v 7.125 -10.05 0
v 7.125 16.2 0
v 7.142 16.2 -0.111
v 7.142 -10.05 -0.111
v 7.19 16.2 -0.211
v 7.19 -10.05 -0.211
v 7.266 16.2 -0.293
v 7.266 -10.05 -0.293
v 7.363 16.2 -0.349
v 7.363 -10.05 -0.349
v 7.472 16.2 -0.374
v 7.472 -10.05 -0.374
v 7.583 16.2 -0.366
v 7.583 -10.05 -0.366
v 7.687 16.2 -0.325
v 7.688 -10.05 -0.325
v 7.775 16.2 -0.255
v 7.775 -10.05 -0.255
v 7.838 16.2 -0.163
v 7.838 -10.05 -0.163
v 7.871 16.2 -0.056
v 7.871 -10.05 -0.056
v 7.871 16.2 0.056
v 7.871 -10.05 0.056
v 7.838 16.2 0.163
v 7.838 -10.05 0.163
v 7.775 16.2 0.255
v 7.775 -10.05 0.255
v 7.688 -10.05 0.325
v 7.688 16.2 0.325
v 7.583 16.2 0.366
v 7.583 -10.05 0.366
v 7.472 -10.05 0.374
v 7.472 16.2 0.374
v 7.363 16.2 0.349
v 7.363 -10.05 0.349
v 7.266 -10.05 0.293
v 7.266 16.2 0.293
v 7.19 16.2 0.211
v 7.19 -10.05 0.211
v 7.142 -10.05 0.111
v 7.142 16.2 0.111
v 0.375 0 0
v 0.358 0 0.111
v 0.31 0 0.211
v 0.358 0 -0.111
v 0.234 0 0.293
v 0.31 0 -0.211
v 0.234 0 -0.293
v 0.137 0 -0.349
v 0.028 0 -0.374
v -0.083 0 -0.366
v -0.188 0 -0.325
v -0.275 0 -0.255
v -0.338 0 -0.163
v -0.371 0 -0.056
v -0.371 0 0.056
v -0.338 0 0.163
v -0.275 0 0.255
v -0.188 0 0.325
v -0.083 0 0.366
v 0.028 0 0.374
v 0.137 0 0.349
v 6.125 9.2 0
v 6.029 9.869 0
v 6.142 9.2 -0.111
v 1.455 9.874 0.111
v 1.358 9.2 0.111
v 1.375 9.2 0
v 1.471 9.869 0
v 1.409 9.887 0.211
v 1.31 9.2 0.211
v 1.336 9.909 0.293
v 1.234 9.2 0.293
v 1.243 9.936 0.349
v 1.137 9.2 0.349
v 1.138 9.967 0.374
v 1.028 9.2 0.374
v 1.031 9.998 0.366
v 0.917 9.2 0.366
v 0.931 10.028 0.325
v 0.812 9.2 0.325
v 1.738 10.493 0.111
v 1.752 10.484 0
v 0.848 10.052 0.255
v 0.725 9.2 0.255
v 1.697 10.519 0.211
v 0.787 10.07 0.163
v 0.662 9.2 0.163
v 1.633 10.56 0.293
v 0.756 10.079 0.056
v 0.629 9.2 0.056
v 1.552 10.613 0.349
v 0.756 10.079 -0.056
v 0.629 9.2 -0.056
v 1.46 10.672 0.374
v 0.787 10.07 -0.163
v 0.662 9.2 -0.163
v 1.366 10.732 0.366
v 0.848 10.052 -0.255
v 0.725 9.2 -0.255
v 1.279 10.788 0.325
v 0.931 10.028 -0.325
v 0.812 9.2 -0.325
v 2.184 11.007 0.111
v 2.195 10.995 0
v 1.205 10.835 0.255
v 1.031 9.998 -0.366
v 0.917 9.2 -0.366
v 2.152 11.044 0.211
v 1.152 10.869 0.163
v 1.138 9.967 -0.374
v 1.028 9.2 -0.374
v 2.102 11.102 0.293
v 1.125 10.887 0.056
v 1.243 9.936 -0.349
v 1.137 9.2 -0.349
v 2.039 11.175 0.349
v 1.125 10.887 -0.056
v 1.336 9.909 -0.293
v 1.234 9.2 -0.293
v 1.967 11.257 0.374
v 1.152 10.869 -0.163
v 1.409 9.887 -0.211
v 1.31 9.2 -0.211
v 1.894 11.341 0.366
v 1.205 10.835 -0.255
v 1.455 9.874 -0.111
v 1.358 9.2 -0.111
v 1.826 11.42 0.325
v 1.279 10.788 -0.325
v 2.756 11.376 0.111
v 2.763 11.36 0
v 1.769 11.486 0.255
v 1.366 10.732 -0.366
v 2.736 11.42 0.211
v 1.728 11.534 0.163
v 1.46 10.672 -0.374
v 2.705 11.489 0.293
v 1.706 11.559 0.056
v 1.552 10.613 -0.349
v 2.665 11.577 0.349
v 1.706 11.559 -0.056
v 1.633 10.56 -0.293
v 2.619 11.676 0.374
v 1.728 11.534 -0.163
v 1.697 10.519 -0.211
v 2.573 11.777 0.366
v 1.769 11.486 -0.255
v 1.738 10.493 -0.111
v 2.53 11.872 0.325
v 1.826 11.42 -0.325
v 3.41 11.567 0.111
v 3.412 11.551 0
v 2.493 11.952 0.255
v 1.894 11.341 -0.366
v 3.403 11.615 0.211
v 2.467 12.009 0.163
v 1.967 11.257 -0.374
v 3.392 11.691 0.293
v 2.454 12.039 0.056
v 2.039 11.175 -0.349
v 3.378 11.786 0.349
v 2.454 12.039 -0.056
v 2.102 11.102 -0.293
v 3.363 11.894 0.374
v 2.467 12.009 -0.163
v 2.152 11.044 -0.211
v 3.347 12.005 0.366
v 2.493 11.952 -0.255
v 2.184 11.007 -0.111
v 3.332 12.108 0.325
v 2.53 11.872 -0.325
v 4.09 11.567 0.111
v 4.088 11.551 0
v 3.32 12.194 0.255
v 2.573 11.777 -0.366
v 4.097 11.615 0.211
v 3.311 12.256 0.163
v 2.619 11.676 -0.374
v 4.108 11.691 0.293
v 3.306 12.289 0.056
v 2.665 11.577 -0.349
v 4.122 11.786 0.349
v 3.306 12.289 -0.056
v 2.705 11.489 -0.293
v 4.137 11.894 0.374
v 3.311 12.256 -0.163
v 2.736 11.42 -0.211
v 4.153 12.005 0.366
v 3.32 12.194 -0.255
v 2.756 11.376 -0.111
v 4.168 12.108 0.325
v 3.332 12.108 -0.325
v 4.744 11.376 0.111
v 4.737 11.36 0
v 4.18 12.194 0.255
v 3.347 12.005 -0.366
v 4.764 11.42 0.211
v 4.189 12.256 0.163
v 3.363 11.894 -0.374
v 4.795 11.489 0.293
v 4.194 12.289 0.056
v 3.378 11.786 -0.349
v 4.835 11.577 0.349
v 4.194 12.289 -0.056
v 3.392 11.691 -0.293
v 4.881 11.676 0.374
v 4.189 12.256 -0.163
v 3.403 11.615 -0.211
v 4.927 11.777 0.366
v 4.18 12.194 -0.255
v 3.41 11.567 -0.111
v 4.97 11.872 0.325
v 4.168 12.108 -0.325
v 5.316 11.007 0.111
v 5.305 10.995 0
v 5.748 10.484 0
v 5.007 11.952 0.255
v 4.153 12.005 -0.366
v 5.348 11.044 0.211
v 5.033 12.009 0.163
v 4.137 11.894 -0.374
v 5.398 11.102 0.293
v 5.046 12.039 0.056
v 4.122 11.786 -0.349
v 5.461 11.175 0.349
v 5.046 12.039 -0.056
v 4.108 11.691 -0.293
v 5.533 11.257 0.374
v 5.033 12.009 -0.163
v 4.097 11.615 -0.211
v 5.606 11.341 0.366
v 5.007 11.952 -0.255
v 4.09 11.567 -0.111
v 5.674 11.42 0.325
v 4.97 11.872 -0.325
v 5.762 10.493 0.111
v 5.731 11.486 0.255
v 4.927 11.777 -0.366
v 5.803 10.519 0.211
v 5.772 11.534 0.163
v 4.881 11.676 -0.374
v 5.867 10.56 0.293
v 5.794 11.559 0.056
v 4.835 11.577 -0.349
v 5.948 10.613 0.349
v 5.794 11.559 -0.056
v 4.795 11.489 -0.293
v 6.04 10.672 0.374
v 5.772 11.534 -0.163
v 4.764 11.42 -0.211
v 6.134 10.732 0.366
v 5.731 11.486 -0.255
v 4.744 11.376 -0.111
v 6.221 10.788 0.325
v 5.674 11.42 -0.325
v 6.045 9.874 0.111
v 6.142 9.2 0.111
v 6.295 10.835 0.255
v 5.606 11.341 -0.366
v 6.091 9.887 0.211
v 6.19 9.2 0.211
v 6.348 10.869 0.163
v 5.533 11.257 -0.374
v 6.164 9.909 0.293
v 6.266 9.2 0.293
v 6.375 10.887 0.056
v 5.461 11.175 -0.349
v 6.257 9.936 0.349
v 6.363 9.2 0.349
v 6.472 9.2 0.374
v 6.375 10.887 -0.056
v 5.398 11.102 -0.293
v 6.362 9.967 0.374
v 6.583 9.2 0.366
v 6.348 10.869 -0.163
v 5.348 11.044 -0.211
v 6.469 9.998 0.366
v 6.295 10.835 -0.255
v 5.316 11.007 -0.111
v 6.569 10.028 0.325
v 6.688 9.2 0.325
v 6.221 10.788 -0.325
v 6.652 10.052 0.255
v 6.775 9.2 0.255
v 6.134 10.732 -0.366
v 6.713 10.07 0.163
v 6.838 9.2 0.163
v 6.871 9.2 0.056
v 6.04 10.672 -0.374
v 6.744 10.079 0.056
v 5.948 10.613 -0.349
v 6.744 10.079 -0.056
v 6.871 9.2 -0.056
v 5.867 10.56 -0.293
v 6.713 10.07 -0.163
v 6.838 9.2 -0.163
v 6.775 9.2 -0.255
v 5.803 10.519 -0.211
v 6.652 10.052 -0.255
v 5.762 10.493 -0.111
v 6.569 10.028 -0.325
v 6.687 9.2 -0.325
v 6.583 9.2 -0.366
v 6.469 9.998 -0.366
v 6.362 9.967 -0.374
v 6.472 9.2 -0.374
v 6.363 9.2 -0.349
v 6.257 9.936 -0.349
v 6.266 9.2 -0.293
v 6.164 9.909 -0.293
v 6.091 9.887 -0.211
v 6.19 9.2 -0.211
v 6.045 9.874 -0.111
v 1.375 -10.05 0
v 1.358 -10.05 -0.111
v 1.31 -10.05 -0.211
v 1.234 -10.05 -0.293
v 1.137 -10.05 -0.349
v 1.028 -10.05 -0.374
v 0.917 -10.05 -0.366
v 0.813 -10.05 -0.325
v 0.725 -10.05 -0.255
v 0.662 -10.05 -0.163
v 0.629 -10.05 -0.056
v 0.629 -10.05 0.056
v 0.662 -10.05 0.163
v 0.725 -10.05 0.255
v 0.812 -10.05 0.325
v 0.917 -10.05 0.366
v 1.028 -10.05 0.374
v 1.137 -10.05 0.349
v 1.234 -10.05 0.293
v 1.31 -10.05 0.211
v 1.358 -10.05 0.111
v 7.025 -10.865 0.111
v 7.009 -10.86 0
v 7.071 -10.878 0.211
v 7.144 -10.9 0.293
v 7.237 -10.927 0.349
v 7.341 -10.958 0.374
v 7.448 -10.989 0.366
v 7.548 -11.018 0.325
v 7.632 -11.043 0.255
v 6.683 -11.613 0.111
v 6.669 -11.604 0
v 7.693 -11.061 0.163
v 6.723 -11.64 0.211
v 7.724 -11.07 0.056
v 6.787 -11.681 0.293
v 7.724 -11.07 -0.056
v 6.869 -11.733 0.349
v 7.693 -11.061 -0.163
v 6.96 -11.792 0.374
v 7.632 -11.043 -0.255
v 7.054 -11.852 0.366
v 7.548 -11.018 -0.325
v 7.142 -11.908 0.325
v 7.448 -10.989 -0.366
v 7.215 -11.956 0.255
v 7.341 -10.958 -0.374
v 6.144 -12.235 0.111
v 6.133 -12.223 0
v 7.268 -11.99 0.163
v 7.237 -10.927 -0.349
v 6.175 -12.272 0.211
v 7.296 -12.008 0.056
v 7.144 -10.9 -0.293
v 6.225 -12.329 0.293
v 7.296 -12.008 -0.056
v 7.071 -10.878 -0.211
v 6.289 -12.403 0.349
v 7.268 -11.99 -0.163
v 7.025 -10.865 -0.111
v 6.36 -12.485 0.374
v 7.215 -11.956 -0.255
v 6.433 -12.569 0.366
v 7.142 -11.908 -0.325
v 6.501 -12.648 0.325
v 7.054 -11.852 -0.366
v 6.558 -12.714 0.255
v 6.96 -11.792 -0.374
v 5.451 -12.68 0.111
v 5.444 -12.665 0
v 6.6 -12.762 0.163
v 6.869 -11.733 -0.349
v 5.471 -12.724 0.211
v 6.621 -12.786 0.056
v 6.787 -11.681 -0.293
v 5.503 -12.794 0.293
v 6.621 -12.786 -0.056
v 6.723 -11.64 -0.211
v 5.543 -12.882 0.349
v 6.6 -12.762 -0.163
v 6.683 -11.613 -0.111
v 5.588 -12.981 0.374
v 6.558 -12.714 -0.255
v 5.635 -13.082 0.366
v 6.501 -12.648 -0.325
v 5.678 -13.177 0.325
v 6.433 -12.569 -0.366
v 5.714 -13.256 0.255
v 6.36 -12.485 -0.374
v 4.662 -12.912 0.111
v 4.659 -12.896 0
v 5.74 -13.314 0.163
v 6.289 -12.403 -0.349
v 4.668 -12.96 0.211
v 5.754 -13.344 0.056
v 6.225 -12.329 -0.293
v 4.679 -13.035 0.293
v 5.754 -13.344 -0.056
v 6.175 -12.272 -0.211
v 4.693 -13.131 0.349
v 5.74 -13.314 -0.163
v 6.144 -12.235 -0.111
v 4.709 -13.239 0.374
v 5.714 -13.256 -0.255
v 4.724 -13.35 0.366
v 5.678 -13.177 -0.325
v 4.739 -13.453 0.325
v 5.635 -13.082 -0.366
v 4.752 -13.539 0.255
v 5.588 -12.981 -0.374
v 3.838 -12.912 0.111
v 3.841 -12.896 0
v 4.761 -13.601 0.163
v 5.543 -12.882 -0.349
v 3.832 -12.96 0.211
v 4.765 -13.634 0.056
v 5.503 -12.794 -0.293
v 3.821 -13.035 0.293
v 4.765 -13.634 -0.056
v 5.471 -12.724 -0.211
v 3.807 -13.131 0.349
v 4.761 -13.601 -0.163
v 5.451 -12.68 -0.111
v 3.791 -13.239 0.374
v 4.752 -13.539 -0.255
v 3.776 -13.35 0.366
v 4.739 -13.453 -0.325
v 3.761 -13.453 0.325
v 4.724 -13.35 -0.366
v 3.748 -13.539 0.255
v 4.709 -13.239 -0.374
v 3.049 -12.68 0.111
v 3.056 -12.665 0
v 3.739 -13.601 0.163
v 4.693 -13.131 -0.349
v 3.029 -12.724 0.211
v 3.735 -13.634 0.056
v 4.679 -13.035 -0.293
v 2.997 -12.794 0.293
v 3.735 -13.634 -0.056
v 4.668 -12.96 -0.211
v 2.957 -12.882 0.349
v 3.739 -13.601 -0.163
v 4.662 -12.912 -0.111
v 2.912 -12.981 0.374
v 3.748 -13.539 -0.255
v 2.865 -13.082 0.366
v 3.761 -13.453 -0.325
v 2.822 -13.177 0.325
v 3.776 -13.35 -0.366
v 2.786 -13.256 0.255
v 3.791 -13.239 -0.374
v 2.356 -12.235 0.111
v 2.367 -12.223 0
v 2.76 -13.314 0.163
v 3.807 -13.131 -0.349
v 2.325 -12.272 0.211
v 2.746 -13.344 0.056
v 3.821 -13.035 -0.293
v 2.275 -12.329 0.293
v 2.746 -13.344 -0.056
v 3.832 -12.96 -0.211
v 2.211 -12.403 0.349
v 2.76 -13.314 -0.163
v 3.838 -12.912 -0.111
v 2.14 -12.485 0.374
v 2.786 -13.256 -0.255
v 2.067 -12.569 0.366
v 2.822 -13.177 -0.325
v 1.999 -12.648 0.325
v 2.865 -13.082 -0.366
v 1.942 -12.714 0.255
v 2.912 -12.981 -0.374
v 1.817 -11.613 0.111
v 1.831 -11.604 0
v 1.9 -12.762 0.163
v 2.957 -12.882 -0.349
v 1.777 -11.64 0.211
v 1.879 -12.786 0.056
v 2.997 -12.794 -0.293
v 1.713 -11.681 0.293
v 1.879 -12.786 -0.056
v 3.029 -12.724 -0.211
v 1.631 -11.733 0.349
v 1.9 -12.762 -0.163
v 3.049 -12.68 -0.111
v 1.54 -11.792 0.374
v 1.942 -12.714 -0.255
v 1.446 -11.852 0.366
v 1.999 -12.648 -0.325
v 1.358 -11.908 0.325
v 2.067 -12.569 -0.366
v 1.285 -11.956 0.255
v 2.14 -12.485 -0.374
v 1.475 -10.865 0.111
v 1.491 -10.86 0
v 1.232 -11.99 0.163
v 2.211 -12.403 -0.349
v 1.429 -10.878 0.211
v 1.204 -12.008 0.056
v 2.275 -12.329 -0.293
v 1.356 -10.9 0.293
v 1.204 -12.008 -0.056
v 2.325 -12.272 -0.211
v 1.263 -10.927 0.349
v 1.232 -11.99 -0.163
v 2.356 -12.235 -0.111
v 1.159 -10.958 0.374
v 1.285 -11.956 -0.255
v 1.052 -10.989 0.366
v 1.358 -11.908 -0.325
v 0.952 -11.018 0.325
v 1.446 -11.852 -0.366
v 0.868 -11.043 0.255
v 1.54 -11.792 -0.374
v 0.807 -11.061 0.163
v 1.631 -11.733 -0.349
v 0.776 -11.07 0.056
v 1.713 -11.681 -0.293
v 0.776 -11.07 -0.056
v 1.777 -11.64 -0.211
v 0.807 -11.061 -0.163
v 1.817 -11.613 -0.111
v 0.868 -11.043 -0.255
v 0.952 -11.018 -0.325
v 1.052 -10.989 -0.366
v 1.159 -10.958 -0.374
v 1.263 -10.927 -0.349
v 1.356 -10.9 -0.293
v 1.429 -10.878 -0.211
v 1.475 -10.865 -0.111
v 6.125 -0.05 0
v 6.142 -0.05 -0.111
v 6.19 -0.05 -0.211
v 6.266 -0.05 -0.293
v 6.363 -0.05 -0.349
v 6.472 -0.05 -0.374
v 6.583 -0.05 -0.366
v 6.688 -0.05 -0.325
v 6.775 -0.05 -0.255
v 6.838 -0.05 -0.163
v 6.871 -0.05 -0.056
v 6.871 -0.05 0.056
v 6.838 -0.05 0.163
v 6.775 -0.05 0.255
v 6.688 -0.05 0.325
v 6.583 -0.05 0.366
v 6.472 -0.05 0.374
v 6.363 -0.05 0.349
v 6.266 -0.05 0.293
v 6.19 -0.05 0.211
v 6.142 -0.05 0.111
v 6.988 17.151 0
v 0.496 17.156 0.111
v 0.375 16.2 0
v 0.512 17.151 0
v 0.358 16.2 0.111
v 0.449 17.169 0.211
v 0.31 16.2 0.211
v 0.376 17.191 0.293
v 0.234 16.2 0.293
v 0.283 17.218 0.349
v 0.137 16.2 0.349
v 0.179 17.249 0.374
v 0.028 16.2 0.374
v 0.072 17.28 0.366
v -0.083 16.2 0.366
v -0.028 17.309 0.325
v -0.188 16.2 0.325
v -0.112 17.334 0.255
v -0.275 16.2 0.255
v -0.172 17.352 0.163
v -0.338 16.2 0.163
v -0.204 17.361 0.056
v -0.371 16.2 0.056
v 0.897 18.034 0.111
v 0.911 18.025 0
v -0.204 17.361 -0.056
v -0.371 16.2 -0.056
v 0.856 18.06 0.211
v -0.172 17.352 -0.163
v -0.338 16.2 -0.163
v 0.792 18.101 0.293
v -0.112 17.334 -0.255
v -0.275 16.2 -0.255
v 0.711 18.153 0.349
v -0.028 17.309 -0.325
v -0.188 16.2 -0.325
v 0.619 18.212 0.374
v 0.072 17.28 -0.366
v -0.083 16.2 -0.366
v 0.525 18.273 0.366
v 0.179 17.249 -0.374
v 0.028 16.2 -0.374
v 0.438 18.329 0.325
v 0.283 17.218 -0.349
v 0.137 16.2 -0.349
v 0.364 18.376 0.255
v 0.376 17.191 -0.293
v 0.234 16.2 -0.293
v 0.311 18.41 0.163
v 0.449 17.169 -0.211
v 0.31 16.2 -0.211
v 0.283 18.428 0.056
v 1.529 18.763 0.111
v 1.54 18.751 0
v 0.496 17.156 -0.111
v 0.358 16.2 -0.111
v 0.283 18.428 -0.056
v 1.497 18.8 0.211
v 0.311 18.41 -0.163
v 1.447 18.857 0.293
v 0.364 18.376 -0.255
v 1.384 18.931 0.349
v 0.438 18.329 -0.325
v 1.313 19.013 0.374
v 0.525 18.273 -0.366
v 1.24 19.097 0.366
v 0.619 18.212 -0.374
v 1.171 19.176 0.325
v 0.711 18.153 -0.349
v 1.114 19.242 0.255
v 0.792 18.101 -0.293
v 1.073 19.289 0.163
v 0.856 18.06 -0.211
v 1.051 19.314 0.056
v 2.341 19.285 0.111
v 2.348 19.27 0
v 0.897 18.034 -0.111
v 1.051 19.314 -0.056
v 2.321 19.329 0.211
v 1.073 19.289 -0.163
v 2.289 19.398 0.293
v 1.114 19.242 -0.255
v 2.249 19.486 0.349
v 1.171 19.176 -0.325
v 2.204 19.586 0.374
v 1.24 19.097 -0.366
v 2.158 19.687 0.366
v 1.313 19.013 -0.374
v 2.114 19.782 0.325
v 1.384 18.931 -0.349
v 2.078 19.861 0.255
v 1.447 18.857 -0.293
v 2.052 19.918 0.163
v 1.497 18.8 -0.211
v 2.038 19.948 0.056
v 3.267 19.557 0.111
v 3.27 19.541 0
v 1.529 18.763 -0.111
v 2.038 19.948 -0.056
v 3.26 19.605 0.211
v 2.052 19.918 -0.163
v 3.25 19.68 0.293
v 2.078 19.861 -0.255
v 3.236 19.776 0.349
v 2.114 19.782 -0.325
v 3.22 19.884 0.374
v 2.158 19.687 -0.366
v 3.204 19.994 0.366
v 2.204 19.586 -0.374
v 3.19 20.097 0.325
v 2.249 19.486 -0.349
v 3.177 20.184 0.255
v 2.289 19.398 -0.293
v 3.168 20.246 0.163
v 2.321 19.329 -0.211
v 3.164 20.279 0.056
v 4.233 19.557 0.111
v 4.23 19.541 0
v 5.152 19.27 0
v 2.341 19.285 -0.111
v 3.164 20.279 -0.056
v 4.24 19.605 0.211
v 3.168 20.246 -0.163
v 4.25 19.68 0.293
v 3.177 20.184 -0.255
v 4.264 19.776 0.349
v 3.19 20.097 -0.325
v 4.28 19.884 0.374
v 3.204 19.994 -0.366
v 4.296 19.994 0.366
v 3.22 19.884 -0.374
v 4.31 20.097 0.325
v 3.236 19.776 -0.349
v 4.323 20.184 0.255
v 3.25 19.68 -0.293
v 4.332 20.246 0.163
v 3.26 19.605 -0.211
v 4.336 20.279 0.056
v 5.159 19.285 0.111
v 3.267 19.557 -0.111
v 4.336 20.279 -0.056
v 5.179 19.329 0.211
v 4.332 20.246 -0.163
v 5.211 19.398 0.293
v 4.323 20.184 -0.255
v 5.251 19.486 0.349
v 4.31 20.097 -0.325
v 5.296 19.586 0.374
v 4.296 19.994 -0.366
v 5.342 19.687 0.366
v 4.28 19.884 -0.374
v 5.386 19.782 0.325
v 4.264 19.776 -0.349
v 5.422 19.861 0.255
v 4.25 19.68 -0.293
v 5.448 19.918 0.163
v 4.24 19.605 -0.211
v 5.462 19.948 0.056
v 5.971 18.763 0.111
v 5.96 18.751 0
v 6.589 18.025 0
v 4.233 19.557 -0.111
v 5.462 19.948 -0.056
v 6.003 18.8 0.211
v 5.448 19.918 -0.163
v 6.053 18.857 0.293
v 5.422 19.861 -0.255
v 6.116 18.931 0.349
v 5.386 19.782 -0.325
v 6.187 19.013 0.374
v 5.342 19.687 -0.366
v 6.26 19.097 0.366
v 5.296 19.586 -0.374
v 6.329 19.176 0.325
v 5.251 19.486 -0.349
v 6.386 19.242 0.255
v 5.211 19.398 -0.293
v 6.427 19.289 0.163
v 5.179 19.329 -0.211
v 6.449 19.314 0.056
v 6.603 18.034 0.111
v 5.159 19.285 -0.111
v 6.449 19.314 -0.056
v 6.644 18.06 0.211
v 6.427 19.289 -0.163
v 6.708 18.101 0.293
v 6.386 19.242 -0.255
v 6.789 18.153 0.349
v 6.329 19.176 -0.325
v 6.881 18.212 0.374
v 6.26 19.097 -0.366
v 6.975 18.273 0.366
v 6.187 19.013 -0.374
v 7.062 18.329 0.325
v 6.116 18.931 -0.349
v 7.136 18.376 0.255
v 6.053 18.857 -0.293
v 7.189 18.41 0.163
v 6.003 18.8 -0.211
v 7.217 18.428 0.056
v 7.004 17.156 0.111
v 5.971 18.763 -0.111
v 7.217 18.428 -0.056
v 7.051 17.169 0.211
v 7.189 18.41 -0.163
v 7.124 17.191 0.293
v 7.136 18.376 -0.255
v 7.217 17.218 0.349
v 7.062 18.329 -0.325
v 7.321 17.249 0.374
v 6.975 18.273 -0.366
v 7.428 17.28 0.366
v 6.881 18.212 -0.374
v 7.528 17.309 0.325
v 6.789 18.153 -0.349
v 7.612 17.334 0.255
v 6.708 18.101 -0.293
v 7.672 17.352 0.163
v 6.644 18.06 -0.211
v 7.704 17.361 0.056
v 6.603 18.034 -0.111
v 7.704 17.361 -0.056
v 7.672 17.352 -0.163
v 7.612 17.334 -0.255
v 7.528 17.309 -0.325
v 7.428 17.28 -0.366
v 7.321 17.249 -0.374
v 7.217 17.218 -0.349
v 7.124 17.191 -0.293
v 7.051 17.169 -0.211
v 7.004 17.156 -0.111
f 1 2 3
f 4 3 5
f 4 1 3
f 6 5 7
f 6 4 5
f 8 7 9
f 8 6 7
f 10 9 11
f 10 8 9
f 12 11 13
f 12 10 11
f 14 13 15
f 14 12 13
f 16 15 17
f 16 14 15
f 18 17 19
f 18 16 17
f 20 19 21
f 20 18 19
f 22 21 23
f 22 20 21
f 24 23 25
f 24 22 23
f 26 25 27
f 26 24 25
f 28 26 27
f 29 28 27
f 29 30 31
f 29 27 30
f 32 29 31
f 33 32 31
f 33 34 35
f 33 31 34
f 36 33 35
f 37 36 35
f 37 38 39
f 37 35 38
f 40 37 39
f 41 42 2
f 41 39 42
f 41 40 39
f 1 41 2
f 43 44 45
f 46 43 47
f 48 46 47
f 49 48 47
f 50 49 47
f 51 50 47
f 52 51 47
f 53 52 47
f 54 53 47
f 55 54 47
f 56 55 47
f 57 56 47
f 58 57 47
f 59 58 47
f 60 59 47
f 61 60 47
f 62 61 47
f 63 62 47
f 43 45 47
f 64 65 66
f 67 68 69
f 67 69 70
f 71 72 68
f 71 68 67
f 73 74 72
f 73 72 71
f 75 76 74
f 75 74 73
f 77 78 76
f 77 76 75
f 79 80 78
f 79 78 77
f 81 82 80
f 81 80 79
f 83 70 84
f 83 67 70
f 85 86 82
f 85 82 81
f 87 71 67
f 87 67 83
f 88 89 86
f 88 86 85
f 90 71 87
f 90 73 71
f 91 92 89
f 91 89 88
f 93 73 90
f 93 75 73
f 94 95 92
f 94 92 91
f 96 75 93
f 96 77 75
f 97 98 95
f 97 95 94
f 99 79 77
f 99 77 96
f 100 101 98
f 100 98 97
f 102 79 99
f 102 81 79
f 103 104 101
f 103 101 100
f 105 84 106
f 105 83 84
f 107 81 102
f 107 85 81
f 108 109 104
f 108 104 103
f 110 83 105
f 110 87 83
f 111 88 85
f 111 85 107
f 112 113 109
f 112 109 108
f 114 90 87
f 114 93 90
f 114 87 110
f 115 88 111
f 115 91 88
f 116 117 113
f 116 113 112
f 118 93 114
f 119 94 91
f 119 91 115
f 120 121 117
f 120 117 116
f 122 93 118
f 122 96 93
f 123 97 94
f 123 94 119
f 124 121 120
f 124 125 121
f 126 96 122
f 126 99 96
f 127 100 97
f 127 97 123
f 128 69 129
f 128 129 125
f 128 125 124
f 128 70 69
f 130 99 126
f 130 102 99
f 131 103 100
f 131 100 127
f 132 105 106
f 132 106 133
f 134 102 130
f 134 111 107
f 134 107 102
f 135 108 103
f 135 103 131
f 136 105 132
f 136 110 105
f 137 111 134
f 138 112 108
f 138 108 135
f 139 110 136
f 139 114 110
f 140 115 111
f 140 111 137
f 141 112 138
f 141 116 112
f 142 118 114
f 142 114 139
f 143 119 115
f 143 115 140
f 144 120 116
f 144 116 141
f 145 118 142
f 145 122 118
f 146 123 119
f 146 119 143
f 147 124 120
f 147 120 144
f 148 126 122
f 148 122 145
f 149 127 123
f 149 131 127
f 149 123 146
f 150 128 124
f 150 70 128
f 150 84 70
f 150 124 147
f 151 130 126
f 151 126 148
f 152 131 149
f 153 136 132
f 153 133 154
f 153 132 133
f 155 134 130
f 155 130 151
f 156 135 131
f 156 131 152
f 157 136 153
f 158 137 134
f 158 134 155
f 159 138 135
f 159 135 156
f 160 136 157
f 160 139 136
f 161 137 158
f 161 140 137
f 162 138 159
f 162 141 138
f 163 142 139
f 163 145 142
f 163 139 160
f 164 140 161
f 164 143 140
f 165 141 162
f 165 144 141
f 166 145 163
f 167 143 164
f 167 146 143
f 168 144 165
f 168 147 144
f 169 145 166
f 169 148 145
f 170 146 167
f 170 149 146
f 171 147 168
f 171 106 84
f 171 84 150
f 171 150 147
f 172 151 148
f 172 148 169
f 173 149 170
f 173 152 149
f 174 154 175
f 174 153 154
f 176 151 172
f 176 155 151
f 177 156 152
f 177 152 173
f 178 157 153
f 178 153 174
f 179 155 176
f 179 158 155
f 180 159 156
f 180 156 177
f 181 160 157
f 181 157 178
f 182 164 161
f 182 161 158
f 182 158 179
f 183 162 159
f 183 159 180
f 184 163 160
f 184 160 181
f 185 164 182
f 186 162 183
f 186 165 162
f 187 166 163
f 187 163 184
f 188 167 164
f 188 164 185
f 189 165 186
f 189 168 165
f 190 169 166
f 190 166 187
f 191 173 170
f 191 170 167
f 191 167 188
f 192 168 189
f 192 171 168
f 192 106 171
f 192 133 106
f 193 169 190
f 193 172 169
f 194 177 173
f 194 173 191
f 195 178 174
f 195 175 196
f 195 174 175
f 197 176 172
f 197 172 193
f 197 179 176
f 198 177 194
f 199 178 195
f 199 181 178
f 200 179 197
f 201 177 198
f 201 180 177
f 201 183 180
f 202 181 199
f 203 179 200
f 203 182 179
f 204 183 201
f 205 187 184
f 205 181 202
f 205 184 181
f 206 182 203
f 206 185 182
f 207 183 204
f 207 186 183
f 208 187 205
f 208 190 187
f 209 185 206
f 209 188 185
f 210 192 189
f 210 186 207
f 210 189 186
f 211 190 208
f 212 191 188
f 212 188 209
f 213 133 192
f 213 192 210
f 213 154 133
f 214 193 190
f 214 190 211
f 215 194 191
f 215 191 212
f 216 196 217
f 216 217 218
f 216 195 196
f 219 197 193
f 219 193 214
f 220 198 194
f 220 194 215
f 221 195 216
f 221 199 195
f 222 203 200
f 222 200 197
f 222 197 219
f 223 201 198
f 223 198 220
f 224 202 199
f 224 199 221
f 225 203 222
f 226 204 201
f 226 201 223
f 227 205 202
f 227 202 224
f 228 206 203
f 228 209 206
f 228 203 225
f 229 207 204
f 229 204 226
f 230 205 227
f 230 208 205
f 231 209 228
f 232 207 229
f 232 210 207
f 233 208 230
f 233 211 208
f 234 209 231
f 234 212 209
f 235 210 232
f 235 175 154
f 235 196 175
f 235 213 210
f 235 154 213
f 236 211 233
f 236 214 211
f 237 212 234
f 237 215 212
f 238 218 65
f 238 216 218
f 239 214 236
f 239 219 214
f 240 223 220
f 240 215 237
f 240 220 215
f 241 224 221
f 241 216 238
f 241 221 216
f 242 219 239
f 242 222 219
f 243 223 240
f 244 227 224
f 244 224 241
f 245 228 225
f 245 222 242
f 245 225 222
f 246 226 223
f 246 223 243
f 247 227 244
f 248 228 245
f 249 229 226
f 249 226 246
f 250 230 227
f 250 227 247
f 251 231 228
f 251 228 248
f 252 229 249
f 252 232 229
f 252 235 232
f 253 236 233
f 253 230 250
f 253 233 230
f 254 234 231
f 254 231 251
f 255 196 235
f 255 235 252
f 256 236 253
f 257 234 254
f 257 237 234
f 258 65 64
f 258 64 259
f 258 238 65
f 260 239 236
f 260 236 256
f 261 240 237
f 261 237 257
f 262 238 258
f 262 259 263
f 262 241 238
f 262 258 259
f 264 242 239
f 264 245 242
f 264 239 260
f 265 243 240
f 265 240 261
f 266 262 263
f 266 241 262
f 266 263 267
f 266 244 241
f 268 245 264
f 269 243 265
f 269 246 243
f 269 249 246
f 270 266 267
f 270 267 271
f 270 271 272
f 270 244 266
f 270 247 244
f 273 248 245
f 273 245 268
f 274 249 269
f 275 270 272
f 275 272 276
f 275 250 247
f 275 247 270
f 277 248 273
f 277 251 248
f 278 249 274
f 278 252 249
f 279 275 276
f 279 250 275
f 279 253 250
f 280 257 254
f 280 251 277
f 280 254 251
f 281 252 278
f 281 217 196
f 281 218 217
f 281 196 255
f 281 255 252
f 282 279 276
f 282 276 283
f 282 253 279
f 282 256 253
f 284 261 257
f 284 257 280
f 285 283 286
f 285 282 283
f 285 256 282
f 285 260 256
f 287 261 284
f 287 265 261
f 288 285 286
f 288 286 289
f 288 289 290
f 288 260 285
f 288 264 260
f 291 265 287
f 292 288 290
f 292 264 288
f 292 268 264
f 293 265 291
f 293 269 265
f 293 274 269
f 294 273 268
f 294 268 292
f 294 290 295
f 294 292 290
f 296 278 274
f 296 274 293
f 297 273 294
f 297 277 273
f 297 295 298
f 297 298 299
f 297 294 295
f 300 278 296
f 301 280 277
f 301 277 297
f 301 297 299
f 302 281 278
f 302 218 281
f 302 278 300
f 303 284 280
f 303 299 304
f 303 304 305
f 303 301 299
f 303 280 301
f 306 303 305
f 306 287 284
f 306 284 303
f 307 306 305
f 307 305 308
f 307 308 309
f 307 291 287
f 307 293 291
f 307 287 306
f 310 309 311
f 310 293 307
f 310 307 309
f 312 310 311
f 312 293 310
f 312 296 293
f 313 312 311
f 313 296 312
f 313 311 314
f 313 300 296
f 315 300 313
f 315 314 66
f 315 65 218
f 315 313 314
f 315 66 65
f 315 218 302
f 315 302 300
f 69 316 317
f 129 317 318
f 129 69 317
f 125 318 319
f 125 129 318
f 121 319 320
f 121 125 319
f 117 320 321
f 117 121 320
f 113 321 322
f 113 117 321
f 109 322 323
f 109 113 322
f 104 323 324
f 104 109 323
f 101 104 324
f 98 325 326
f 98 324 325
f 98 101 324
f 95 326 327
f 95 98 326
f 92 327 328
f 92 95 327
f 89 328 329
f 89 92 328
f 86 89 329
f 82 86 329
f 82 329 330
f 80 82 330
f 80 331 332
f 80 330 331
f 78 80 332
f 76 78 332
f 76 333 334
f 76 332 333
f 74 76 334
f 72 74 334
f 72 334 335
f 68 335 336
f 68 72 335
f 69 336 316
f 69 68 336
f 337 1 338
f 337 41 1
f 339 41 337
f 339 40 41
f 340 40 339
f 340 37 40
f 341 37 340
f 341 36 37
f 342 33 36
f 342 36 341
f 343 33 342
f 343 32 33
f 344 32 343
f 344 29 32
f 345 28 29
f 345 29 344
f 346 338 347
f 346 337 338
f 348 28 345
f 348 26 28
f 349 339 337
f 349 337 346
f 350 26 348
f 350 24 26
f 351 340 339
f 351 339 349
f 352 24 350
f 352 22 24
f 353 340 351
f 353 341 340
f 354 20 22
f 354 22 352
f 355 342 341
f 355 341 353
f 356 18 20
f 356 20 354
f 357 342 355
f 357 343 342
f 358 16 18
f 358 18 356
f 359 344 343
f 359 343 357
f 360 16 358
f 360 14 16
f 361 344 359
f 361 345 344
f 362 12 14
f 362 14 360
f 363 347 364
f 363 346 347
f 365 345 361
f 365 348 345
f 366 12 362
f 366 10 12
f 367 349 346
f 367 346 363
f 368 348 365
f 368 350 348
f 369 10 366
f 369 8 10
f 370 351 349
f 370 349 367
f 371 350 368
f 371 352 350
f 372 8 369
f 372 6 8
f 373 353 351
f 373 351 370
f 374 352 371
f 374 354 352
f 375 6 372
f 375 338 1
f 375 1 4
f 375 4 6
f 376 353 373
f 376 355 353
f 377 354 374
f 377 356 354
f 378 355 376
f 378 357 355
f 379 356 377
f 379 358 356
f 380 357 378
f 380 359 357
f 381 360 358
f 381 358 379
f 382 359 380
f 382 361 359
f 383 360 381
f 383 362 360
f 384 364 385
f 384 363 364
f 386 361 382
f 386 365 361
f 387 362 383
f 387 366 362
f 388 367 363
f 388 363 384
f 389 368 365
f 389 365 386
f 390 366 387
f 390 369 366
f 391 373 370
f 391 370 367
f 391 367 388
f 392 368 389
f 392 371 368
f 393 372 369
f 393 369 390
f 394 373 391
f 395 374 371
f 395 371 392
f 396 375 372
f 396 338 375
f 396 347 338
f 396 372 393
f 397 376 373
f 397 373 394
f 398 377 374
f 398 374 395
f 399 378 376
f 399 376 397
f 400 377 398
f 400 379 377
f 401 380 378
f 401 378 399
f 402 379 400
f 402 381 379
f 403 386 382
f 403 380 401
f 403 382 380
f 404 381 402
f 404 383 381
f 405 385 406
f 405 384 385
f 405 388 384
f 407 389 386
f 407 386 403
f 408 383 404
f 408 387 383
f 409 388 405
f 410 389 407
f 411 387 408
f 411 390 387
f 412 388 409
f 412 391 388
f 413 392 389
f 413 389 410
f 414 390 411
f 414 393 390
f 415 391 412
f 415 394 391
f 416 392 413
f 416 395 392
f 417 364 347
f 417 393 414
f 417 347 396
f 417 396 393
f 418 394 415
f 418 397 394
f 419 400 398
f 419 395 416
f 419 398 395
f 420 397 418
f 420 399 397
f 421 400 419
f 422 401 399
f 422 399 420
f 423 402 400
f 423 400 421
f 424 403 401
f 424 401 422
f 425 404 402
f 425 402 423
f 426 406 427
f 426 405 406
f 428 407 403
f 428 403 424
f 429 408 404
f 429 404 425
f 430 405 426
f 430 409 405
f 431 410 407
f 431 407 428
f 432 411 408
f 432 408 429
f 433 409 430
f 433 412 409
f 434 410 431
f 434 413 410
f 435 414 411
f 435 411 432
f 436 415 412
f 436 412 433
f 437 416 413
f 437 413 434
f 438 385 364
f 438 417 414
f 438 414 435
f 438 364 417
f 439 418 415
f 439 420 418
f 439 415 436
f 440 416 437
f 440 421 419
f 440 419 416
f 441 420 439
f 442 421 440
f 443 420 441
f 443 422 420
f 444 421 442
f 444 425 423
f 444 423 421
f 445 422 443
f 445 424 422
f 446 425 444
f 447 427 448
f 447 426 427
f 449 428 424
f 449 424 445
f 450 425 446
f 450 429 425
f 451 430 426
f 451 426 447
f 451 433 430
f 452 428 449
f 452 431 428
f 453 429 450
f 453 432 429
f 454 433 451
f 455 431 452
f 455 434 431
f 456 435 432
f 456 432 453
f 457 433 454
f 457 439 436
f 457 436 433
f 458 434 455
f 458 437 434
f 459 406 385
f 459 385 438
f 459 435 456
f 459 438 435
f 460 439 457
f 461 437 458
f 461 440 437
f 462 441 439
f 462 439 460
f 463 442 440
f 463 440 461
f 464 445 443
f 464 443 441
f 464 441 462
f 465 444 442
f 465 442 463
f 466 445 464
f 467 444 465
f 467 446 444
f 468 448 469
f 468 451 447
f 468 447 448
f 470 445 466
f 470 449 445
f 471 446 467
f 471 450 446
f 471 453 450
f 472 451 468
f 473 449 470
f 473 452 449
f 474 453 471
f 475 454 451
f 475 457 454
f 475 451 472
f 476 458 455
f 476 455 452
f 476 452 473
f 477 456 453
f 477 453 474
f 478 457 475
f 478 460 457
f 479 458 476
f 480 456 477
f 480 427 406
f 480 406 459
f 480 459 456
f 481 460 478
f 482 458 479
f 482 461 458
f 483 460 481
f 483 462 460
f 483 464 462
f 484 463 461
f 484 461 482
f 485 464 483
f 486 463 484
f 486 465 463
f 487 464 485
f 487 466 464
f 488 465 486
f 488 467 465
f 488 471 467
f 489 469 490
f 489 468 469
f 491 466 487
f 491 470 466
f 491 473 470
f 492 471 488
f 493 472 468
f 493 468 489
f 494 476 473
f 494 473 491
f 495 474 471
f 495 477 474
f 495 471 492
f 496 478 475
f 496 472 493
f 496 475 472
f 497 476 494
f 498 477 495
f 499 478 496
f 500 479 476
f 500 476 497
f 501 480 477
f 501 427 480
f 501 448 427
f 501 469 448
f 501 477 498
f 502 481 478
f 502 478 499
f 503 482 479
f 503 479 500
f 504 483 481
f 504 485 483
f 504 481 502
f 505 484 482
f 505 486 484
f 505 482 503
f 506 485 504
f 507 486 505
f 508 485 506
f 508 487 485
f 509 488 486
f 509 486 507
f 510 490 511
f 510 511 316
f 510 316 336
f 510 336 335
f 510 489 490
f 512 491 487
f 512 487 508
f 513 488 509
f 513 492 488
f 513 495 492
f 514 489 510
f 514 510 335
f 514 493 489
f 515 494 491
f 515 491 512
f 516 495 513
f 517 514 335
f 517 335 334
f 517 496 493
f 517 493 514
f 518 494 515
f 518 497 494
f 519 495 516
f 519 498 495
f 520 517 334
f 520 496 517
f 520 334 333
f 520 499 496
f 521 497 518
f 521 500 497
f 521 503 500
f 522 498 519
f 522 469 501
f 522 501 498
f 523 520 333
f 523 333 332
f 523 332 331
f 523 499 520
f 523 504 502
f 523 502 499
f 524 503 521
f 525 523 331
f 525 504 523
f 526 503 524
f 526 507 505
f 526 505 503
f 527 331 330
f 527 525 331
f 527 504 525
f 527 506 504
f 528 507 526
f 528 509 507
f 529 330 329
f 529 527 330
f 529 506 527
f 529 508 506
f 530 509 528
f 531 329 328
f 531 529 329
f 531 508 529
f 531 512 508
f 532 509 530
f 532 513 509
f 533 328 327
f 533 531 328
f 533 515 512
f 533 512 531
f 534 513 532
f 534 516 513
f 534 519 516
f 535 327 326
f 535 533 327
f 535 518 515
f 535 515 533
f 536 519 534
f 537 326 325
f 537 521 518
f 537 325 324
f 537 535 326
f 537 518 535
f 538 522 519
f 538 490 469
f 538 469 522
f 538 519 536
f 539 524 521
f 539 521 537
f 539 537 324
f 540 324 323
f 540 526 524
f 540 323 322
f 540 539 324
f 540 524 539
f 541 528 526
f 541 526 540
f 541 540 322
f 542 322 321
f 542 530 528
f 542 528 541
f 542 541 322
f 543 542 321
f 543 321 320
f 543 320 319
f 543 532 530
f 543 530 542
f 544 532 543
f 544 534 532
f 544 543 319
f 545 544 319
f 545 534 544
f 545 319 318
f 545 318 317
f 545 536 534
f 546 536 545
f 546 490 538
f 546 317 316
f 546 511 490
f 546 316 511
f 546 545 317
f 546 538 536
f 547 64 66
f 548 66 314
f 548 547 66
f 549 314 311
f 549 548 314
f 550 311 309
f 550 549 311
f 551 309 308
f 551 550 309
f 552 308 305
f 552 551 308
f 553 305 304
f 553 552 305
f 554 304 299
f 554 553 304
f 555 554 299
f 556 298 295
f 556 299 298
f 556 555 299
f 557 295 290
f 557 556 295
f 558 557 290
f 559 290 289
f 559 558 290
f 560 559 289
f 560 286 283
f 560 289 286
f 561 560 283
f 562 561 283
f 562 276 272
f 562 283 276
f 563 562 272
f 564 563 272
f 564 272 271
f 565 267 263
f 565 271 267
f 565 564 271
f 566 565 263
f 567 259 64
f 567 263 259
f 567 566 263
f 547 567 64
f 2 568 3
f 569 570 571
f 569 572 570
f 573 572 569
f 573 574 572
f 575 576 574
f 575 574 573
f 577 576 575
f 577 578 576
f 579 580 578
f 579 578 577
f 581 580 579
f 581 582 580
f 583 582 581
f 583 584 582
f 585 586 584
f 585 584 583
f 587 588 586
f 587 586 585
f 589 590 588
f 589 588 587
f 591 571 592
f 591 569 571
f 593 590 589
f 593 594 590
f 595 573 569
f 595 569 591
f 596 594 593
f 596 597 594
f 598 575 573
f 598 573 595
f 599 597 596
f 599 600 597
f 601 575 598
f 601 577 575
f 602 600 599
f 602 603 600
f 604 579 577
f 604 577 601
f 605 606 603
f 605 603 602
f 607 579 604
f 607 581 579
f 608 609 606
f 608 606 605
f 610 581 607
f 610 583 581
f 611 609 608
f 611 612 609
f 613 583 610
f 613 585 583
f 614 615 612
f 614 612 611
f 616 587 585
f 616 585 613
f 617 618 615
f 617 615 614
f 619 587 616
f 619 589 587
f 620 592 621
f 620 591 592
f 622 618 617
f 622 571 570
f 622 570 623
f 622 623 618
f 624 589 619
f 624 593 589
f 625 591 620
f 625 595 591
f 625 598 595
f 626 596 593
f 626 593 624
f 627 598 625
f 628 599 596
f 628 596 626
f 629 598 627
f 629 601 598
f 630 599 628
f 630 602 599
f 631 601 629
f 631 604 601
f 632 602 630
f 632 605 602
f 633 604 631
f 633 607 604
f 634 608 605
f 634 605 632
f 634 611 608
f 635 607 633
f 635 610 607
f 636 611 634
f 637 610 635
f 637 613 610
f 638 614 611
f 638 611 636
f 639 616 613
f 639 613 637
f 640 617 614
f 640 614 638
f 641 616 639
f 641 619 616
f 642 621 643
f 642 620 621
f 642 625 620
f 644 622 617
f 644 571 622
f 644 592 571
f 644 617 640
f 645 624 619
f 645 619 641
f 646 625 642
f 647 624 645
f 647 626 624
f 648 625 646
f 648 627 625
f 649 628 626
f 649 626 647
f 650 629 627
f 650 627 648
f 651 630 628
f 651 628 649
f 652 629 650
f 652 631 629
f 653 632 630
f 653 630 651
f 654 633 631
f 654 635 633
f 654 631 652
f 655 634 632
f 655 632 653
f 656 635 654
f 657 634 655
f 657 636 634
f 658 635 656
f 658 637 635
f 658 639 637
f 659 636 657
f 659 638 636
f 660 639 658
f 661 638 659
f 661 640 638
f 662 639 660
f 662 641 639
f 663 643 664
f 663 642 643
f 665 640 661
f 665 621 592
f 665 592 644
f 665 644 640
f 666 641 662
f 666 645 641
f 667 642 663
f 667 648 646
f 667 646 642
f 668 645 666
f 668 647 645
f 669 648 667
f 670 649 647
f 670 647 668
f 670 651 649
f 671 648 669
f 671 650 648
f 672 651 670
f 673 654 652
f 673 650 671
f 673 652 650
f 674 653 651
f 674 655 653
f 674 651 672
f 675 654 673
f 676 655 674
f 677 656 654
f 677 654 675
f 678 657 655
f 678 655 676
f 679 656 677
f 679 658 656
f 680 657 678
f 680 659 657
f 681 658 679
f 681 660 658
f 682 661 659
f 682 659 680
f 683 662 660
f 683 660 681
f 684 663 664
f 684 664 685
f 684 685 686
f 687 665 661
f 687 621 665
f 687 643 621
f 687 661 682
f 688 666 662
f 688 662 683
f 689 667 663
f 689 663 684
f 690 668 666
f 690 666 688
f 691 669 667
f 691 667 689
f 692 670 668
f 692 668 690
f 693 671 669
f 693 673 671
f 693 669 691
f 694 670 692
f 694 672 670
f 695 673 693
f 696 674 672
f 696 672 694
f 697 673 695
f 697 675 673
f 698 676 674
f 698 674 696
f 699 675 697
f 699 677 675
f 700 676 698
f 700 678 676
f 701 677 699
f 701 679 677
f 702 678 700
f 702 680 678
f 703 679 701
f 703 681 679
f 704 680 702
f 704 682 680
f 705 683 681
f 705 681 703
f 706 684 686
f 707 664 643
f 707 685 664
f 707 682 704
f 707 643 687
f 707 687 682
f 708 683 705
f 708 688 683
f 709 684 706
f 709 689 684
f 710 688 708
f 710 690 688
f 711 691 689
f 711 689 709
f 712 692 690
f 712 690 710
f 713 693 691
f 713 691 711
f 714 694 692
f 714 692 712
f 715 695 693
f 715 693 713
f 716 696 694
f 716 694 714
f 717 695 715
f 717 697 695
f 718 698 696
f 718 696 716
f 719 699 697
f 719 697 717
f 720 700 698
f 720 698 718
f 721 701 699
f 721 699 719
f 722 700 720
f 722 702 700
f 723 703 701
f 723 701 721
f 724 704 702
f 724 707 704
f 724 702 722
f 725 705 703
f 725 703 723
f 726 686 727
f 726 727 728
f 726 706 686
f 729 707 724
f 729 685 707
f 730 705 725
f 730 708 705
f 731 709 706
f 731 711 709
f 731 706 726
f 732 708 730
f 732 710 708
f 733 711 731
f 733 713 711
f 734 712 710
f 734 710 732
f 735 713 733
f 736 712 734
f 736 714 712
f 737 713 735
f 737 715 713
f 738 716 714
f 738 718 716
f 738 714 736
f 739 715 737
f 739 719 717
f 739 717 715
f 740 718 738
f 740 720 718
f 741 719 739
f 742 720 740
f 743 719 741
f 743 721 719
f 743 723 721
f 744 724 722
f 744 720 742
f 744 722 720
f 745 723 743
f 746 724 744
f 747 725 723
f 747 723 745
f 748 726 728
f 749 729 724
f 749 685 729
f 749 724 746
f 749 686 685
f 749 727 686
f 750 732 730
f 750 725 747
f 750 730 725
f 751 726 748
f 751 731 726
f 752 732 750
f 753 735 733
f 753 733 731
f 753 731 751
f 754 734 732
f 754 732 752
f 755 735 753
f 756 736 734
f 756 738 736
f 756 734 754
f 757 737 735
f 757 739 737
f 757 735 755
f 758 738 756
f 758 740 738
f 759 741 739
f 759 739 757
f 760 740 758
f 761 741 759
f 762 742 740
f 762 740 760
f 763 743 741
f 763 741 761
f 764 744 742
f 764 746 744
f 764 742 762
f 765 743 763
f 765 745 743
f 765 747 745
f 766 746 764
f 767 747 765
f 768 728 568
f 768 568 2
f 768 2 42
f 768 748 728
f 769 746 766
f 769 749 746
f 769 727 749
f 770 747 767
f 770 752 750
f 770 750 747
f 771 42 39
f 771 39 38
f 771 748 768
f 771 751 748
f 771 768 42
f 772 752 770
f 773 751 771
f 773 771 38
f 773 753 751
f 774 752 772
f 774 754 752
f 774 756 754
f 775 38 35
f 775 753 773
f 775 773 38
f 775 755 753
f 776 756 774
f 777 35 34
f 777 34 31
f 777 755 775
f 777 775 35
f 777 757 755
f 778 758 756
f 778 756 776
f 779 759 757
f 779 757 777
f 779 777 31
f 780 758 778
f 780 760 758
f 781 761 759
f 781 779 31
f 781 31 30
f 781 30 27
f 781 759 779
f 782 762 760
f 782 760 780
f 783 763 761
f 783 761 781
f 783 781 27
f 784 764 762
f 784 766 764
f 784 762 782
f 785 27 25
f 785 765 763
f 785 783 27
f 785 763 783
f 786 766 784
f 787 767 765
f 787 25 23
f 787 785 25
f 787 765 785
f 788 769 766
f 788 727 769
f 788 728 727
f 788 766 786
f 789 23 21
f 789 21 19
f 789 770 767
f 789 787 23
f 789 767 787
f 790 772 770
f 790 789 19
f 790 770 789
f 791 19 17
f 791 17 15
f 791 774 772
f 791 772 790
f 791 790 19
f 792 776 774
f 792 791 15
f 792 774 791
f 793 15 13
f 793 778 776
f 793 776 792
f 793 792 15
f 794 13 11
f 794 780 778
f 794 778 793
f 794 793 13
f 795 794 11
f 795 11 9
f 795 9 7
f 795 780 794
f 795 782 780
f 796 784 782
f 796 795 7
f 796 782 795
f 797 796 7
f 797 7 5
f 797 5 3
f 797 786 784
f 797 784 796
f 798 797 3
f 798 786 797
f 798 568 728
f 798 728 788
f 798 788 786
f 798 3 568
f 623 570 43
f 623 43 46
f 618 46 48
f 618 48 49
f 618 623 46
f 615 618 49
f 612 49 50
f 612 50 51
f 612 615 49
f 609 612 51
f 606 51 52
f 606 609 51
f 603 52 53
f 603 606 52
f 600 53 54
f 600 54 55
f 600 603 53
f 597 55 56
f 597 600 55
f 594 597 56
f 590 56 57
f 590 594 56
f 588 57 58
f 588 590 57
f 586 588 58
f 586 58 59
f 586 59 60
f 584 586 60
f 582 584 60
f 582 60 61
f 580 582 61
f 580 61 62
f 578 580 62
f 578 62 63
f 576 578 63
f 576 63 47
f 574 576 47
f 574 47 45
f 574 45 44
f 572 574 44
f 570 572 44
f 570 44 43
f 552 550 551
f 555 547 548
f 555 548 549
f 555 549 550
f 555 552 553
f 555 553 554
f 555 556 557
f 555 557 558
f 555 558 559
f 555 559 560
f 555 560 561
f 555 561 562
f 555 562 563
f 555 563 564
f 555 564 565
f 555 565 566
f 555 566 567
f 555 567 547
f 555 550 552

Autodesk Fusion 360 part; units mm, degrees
sketch "sweep path" plane through (0, 0, 0) normal (0, 0, 1) x (1, 0, 0)
  line L0 (0, 0) -> (0, 16.2)
  line L1 (0, 16.2) -> (7.5, 16.2)
  line L2 (7.5, 16.2) -> (7.5, -10.05)
  line L3 (7.5, -10.05) -> (1, -10.05) construction
  line L4 (1, -10.05) -> (1, 9.2)
  line L5 (1, 9.2) -> (6.5, 9.2)
  line L6 (6.5, 9.2) -> (6.5, -0.05)
  arc A0 (7.5, 16.2) -> (0, 16.2) centre (3.75, 16.2) ccw
  arc A1 (6.5, 9.2) -> (1, 9.2) centre (3.75, 9.2) ccw
  arc A2 (1, -10.05) -> (7.5, -10.05) centre (4.25, -10.05) ccw
  dimension "d1" = 16.2
  dimension "d2" = 7.5
  dimension "d3" = 26.25
  dimension "d4" = 6.5
  dimension "d5" = 19.25
  dimension "d6" = 5.5
  dimension "d7" = 9.25
sketch "Sketch2" plane through (0, 0, 0) normal (0, 1, 0) x (1, 0, 0)
  circle A0 centre (0, 0) radius 0.375
  dimension "d8" = 0.75
sweep "Sweep1" add profiles "Sketch2" path "sweep path" along L0 A0 L2 A2 L4 A1 L6 section 1
